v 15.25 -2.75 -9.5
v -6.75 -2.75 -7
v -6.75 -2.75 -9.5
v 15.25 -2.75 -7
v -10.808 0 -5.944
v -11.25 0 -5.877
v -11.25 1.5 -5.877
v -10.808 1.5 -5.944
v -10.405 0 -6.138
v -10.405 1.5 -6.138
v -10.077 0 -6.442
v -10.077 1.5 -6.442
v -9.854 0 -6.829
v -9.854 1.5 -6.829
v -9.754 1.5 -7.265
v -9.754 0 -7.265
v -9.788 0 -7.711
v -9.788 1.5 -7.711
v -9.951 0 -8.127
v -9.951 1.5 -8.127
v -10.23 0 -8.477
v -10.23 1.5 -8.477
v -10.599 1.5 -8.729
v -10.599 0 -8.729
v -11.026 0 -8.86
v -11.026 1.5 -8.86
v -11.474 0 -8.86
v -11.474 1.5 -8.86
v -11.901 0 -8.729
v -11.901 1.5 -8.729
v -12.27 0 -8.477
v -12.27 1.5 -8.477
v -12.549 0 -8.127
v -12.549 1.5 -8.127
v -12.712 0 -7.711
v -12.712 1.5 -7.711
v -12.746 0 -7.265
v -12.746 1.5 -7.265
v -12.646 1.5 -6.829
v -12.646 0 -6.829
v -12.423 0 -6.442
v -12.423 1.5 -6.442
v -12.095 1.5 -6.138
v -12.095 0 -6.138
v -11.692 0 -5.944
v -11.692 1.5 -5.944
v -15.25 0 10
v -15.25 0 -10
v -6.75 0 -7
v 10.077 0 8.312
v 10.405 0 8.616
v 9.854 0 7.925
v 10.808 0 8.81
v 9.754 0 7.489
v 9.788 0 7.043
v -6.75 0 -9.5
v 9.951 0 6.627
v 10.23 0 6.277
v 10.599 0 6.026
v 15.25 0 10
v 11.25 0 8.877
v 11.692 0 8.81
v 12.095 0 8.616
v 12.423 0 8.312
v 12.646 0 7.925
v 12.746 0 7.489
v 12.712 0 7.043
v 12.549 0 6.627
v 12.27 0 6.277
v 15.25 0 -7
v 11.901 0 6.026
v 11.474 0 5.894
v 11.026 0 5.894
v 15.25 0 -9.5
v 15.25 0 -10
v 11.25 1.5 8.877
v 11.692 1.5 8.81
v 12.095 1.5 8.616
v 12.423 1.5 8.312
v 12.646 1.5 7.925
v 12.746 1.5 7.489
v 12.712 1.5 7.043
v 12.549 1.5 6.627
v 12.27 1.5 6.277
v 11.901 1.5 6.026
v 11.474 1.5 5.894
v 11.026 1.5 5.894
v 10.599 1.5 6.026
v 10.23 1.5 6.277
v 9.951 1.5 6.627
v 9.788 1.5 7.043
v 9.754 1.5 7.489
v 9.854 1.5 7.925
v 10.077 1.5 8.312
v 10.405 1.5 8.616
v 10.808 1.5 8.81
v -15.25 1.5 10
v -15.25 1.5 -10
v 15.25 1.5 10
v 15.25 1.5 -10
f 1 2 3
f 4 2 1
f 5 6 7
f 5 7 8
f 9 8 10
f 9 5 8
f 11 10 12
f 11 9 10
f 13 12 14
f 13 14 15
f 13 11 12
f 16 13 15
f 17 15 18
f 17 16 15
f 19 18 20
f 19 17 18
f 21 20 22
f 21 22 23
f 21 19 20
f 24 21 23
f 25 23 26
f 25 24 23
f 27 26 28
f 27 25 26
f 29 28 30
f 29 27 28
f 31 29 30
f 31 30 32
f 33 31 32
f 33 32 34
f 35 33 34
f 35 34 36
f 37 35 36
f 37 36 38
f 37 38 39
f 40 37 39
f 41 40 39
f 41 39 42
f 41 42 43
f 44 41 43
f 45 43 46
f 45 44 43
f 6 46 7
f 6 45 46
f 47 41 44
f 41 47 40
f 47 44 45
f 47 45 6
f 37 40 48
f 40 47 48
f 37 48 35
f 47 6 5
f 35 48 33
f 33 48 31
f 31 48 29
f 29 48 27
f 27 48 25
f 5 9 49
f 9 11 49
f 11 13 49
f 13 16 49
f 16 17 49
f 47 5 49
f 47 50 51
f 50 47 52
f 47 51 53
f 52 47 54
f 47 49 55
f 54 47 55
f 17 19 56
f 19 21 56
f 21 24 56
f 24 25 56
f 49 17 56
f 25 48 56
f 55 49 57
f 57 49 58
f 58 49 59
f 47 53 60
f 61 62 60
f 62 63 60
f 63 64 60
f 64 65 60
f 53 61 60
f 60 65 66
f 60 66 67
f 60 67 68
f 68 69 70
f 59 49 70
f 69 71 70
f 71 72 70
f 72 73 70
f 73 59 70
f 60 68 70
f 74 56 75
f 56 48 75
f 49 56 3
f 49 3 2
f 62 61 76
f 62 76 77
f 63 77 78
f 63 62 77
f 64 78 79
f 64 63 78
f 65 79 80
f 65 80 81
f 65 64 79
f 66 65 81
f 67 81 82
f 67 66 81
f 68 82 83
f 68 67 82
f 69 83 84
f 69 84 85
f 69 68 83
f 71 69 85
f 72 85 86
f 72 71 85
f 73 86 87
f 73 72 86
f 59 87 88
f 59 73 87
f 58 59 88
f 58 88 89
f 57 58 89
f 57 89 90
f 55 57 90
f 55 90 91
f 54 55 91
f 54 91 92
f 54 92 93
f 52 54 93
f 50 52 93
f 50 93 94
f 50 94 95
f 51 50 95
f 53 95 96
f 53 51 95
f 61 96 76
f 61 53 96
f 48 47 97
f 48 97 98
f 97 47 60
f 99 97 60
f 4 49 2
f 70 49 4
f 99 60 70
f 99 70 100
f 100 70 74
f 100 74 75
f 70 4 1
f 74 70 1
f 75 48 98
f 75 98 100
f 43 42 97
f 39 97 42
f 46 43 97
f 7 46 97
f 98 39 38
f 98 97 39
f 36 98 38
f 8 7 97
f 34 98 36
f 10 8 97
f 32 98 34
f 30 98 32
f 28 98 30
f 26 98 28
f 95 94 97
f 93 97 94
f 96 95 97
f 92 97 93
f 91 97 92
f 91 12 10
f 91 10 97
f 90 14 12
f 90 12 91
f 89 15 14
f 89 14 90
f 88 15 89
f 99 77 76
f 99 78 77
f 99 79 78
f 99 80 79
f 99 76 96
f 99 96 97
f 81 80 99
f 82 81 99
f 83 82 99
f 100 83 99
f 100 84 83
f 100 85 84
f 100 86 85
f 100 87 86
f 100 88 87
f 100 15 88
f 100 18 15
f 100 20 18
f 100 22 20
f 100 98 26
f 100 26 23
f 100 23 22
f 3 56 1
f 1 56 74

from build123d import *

# Parameters (mm, degrees)
CROQUIS1_W              = 30.5
CROQUIS1_H              = 20
CROQUIS1_R              = 1.5
SALIENTE_EXTRUIR1_DEPTH = 1.5
CROQUIS2_W              = 22
CROQUIS2_H              = 2.5
SALIENTE_EXTRUIR2_DEPTH = 2.75


with BuildPart() as part:
    # Croquis1 → Saliente-Extruir1 (new body)
    with BuildSketch(Plane(origin=(0, 0, 0), x_dir=(1, 0, 0), z_dir=(0, 1, 0))):
        Rectangle(CROQUIS1_W, CROQUIS1_H)
        with Locations(Location((-11.25, 7.37704918, 0), (0, 0, 270))):
            Circle(CROQUIS1_R, mode=Mode.SUBTRACT)
        with Locations(Location((11.25, -7.37704918, 0), (0, 0, 270))):
            Circle(CROQUIS1_R, mode=Mode.SUBTRACT)
    extrude(amount=SALIENTE_EXTRUIR1_DEPTH)

    # Croquis2 → Saliente-Extruir2 (add)
    with BuildSketch(Plane.XZ):
        with Locations((4.25, -8.25)):
            Rectangle(CROQUIS2_W, CROQUIS2_H)
    extrude(amount=SALIENTE_EXTRUIR2_DEPTH)


solid = part.part
